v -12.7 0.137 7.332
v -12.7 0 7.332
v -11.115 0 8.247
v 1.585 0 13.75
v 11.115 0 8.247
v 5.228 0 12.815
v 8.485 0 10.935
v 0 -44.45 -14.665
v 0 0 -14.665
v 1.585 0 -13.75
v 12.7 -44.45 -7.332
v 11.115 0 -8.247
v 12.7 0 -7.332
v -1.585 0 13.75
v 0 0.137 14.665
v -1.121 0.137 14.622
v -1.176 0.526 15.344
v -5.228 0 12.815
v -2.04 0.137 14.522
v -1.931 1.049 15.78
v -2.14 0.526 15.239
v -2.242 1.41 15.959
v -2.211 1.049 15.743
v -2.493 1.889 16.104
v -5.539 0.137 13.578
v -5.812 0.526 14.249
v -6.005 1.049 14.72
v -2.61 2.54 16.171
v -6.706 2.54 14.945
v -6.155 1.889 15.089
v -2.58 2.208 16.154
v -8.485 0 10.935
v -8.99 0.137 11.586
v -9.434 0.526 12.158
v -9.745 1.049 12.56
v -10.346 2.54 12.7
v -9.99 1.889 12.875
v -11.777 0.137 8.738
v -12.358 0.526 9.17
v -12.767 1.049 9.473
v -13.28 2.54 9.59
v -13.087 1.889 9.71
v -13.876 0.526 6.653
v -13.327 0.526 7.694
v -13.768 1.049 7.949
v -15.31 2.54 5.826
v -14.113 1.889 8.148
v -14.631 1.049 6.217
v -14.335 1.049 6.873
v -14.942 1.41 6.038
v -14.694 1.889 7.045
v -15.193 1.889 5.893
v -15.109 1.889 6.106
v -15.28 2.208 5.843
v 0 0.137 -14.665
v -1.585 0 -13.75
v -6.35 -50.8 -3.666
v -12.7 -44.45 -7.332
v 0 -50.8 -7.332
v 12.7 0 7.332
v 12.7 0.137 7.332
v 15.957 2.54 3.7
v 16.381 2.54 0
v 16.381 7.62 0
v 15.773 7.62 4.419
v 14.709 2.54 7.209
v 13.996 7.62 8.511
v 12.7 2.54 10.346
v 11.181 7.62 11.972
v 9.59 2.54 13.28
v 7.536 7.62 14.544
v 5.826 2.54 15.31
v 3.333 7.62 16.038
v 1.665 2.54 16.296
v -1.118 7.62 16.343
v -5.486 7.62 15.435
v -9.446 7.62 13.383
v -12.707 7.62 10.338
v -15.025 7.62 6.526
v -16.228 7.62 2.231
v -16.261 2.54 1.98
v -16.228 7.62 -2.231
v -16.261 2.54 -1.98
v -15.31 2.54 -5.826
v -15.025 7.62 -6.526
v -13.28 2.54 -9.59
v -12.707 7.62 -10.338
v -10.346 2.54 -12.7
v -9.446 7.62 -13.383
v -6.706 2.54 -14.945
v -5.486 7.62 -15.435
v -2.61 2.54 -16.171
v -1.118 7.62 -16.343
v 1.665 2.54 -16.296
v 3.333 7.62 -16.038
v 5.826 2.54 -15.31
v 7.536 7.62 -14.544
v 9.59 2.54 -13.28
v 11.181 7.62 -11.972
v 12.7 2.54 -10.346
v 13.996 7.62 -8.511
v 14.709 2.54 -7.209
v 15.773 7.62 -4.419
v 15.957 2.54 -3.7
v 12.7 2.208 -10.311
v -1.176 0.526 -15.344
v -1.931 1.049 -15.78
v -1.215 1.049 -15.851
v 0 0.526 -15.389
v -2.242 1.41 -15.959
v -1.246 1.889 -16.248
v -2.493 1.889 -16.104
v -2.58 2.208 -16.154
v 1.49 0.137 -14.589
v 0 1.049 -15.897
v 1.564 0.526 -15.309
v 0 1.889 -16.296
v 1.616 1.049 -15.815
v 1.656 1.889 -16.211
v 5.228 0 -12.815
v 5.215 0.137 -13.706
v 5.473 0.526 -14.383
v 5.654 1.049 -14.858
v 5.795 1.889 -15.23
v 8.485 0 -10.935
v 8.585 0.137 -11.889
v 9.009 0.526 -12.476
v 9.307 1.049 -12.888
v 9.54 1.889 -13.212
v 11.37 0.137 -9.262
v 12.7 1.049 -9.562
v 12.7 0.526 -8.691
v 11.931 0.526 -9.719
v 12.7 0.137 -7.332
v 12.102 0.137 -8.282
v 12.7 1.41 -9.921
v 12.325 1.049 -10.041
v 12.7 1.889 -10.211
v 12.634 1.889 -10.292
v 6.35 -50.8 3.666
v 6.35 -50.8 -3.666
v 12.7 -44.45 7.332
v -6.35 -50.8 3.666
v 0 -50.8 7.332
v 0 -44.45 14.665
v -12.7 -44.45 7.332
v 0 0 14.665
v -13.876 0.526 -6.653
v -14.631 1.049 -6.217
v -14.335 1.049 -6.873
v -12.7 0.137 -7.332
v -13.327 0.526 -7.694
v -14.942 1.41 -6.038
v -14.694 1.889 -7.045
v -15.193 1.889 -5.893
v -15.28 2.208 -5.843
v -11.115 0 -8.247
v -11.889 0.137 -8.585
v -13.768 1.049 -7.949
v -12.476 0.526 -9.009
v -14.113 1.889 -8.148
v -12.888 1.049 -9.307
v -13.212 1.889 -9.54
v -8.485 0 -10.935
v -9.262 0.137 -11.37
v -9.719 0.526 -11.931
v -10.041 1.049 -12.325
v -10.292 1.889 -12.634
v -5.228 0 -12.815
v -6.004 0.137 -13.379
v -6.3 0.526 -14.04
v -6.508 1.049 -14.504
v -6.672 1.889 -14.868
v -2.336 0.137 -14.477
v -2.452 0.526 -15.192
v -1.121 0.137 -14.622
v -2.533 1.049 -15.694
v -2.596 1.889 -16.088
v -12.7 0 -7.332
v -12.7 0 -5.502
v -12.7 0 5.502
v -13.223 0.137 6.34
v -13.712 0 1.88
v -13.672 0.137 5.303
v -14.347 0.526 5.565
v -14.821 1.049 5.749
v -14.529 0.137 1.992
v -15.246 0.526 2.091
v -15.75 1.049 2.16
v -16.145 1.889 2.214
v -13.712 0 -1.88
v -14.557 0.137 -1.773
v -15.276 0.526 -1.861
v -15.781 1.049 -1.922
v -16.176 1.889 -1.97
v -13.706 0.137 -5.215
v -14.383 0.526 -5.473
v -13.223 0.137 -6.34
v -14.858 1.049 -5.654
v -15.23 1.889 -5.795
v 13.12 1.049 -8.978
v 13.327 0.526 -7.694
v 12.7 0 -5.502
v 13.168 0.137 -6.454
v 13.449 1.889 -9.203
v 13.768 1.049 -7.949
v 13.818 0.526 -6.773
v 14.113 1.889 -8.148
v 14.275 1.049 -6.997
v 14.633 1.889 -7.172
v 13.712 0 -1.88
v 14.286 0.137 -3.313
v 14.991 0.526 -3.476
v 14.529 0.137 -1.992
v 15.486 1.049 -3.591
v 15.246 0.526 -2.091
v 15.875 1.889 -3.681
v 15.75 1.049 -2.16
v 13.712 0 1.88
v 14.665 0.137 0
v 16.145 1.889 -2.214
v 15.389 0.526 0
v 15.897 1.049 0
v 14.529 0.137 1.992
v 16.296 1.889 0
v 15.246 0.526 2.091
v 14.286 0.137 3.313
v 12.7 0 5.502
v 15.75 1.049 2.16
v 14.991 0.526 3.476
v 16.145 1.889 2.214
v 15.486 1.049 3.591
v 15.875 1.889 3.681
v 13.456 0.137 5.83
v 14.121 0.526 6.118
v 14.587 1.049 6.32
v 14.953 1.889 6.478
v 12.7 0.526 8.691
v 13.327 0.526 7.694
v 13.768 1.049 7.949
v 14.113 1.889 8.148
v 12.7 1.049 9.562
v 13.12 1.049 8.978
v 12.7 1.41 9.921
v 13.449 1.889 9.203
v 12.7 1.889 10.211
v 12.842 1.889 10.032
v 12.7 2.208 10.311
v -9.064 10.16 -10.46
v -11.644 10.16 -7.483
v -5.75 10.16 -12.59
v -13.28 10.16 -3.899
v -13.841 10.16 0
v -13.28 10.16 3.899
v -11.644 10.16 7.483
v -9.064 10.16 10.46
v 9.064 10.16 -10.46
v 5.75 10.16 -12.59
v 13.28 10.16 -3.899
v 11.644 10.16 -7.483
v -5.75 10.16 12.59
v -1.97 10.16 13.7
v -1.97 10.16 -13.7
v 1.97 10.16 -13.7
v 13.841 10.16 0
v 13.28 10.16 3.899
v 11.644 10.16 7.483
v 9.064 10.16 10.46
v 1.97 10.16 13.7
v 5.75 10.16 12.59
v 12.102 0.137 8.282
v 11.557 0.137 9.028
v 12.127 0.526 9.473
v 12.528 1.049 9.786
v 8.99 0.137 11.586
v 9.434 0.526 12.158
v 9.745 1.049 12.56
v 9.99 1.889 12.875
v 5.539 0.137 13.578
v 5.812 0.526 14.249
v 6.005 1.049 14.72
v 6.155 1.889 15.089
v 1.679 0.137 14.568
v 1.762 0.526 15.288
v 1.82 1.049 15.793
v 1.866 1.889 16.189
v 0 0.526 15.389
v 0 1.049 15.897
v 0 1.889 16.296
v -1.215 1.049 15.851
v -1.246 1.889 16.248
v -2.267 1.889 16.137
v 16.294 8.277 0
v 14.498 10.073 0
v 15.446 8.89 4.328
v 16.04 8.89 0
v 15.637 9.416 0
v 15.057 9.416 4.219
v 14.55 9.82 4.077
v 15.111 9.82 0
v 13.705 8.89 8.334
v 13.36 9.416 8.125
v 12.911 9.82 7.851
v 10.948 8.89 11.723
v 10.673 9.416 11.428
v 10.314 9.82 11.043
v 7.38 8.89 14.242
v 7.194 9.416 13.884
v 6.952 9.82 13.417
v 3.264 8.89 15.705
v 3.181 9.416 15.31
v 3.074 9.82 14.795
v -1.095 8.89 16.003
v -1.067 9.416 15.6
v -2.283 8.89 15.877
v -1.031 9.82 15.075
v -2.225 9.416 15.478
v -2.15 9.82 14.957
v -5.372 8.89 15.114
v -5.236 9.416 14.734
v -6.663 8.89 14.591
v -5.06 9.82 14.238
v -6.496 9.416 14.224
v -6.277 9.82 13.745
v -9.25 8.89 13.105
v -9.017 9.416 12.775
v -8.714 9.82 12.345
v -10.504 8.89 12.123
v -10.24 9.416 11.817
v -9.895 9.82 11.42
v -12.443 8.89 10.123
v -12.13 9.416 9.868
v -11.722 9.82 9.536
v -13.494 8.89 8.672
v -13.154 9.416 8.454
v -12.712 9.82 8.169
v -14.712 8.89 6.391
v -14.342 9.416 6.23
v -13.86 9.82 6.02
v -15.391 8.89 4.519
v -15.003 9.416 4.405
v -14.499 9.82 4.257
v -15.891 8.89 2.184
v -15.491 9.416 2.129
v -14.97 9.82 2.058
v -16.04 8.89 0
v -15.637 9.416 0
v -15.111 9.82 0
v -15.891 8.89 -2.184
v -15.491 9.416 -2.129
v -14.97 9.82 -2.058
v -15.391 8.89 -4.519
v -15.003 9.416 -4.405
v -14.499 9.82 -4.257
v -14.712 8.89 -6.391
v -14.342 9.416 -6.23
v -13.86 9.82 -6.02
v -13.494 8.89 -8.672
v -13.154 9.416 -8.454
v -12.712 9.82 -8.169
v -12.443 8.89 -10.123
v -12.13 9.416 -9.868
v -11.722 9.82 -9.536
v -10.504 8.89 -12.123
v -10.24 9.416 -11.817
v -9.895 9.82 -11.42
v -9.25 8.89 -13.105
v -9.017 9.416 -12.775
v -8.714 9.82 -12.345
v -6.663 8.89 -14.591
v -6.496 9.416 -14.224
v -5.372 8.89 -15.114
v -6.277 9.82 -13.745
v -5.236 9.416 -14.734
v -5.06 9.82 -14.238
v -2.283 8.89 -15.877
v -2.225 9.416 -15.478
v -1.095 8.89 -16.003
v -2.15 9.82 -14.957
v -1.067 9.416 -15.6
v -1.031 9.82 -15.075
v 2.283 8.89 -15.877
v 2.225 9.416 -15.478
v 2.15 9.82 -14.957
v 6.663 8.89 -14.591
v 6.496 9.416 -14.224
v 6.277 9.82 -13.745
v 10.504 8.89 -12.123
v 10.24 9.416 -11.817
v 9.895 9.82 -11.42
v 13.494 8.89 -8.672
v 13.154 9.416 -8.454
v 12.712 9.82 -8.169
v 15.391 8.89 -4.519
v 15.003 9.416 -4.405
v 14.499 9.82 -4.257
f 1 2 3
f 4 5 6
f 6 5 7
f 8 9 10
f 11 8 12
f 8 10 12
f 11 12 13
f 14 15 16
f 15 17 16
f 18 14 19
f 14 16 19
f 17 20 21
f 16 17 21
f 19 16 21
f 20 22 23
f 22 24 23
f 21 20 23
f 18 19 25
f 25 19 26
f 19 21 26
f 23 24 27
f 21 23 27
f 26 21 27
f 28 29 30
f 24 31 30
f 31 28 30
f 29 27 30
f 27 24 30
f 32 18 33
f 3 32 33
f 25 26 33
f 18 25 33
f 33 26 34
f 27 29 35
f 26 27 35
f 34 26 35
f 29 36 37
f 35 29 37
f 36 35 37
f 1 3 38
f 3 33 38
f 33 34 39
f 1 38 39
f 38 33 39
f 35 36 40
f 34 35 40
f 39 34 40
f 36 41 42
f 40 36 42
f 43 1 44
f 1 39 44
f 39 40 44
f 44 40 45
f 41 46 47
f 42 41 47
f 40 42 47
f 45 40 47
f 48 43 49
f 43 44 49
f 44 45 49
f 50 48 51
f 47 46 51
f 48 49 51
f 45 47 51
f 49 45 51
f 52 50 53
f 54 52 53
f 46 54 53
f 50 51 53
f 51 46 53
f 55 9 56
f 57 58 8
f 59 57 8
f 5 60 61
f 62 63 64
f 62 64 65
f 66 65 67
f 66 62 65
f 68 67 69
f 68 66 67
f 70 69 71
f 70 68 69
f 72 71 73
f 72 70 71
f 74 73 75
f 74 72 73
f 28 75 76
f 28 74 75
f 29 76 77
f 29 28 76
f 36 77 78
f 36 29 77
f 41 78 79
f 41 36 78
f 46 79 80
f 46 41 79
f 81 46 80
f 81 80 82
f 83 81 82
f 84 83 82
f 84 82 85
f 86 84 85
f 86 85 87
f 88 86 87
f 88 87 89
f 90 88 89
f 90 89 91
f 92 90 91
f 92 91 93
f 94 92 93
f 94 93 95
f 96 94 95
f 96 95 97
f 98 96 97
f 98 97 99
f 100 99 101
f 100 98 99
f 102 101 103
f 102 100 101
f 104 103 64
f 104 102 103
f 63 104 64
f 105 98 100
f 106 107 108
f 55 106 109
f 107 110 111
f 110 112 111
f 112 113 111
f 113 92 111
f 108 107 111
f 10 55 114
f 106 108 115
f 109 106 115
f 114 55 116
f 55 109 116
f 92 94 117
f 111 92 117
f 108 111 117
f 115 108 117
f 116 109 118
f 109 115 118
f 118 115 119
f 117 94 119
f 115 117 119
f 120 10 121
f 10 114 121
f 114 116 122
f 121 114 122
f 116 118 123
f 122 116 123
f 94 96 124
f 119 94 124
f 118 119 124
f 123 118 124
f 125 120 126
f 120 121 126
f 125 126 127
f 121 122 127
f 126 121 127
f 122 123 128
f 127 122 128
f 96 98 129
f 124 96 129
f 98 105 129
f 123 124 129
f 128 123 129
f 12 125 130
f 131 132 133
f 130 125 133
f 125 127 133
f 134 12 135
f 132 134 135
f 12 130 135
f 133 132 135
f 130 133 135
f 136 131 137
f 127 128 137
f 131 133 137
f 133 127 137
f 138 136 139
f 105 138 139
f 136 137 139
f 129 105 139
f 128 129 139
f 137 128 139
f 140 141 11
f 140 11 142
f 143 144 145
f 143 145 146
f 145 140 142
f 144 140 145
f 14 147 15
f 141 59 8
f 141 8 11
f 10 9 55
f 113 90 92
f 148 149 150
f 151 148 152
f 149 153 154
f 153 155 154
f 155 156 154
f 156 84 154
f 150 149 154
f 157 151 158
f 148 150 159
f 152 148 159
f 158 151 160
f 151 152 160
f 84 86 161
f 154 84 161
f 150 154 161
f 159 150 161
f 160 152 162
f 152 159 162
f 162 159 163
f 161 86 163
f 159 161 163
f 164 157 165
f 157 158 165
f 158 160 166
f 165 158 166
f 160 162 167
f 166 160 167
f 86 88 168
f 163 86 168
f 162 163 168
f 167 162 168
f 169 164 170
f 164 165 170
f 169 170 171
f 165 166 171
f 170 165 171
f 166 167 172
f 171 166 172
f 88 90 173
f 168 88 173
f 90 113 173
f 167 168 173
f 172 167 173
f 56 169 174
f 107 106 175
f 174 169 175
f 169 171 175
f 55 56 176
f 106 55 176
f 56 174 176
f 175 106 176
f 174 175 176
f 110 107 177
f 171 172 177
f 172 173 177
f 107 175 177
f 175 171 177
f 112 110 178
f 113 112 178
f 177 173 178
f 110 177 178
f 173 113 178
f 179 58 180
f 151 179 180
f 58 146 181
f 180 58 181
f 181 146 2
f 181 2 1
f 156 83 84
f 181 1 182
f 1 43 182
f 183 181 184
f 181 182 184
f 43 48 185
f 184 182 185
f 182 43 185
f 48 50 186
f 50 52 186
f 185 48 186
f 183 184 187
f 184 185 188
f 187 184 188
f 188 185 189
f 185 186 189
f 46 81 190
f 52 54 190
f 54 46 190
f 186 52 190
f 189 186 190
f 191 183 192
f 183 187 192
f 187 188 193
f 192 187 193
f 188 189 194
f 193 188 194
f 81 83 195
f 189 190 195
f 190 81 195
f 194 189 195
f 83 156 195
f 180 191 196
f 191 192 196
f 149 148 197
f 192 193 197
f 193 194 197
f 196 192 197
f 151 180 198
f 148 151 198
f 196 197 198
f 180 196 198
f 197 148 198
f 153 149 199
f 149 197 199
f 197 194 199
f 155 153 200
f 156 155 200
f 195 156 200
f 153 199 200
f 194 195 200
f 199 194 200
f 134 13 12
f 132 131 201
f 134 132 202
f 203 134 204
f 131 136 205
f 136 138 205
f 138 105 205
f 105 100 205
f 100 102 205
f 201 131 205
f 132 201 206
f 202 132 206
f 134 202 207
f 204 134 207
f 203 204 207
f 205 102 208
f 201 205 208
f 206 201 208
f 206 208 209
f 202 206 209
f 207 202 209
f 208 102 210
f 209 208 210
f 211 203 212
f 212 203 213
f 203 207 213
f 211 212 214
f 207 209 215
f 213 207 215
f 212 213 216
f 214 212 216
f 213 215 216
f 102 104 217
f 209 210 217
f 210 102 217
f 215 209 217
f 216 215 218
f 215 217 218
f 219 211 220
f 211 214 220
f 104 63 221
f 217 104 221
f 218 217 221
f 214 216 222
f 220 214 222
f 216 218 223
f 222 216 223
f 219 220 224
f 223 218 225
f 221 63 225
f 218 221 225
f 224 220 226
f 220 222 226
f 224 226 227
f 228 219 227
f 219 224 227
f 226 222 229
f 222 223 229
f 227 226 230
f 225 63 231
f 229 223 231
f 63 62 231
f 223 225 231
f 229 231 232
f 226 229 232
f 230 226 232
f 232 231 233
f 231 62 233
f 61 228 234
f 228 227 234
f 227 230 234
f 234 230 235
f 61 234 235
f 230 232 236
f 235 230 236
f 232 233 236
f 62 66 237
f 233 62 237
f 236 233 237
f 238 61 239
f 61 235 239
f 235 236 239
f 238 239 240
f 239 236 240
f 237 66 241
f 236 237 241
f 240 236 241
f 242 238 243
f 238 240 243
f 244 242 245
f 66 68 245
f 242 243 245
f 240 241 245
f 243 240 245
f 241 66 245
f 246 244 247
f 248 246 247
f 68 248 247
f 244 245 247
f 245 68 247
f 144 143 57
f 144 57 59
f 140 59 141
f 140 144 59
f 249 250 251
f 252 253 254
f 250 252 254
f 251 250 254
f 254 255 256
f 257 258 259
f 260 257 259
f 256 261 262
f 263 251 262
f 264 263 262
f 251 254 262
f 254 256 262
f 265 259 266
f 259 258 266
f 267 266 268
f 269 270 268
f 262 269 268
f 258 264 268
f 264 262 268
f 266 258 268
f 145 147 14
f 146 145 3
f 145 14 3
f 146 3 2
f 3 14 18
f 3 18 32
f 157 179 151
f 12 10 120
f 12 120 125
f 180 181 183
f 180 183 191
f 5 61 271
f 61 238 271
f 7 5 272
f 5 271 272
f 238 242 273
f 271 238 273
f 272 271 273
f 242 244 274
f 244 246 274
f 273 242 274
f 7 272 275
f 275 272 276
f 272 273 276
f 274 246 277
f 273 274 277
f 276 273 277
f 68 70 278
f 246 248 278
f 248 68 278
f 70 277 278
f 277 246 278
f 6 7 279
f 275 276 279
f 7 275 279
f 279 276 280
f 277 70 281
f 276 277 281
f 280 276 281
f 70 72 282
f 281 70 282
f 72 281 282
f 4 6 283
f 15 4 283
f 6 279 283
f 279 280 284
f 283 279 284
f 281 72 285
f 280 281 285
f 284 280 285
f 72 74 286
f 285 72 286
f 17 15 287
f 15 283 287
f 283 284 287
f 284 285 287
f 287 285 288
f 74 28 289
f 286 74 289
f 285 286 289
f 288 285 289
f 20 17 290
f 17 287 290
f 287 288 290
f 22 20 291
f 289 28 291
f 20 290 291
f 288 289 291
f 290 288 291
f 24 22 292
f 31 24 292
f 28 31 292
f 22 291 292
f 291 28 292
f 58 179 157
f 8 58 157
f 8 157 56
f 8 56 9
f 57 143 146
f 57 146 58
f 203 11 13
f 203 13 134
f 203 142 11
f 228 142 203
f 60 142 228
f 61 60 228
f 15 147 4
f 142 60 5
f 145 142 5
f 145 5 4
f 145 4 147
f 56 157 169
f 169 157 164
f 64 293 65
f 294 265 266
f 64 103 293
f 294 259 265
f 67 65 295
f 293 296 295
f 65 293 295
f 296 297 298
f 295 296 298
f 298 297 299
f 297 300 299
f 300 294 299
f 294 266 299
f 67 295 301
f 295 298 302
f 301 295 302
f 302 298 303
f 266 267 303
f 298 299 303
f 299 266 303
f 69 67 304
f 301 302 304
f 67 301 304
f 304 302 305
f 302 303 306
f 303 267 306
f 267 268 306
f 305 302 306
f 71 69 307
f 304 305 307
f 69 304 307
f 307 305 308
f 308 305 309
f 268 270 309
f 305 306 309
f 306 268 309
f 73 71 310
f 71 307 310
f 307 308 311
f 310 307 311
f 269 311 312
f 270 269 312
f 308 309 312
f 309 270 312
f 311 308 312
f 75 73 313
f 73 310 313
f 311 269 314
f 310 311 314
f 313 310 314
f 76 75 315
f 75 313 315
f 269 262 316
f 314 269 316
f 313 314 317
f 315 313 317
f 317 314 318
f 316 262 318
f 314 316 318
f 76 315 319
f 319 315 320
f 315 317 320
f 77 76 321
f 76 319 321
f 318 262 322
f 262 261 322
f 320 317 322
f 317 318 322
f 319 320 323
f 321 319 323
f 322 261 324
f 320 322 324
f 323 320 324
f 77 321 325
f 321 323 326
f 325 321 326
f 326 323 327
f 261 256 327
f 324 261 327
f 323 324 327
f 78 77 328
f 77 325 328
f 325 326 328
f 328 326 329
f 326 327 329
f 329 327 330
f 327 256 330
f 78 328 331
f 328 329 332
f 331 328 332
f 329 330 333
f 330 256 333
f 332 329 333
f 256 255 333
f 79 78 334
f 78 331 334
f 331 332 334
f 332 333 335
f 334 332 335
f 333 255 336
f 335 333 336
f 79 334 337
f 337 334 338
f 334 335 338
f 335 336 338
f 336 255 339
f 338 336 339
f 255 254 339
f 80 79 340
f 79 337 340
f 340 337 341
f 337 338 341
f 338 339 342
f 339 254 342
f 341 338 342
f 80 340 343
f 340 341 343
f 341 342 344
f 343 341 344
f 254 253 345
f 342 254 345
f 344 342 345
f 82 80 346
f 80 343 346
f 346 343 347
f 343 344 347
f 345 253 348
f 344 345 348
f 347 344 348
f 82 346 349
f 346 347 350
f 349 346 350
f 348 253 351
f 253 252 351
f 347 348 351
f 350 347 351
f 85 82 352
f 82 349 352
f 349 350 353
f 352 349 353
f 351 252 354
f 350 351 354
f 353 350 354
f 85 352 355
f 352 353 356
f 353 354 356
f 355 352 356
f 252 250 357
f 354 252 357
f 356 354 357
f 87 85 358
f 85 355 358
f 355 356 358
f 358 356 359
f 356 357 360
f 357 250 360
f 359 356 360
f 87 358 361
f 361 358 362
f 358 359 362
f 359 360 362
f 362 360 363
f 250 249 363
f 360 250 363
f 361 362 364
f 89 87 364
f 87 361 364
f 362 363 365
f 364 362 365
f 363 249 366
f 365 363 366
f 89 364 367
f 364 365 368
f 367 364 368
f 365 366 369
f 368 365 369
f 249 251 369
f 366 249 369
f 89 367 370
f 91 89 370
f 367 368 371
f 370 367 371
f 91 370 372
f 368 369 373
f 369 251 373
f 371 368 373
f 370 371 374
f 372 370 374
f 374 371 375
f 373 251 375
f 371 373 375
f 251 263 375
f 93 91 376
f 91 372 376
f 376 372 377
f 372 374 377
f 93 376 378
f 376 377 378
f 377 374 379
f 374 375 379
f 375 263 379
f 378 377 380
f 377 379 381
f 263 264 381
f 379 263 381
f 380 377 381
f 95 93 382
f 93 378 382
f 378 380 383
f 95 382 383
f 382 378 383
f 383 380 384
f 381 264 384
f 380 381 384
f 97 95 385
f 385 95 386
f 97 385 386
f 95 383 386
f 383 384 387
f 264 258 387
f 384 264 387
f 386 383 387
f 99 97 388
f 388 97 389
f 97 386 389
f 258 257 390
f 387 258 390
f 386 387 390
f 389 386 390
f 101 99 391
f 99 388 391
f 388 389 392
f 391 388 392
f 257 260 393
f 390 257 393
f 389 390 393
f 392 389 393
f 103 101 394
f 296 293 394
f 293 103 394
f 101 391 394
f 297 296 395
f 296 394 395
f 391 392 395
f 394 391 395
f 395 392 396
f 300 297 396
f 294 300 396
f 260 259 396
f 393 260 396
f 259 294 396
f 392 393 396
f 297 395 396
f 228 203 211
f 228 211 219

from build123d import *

# Parameters (mm, degrees)
F1_DEPTH = 50.8
F2_R     = 16.3806904911
F3_DEPTH = 10.16
F6_SIZE  = 6.35


# Not quite as in the source:
# - a fillet or chamfer that OpenCascade refuses, or shapes differently, is made with other operations: its cross-section is extruded or revolved along the edge and cut away or added


with BuildPart() as f1:
    # F0 (on Front) → F1 (new body)
    with BuildSketch(Plane.XZ):
        Polygon((12.7, -7.3323484187), (12.7, 7.3323484187), (0, 14.6646968374), (-12.7, 7.3323484187), (-12.7, -7.3323484187), (0, -14.6646968374), align=None)
    extrude(amount=F1_DEPTH)

    # F2 (on Front) + F1_face (on face) + F1_face1 (on face) → F3 (join)
    with BuildSketch(Plane.XZ):
        Circle(F2_R)
    with BuildSketch(Plane(origin=(0, 0, 0), x_dir=(1, 0, 0), z_dir=(0, 1, 0))):
        Polygon((12.7, -7.3323484187), (12.7, 7.3323484187), (0, 14.6646968374), (-12.7, 7.3323484187), (-12.7, -7.3323484187), (0, -14.6646968374), align=None)
    with BuildSketch(Plane.XZ.offset(50.8)):
        Polygon((12.7, -7.3323484187), (12.7, 7.3323484187), (0, 14.6646968374), (-12.7, 7.3323484187), (-12.7, -7.3323484187), (0, -14.6646968374), align=None)
    extrude(amount=-F3_DEPTH, dir=(0, -1, 0))

    # F4: fillet of radius 2.54 on 3 edges, made by hand

    # F4_s1 → F4_t2 (revolve, cut)
    with BuildSketch(Plane.XY):
        with BuildLine():
            ThreePointArc((16.3806904911, 7.62), (15.6367417153, 9.4160512242), (13.8406904911, 10.16))
            Line((13.8406904911, 10.16), (16.3806904911, 10.16))
            Line((16.3806904911, 10.16), (16.3806904911, 7.62))
        make_face()
    revolve(axis=Axis((0, 10.16, 0), (0, -1, 0)), mode=Mode.SUBTRACT)


with BuildPart() as f4_tool4:
    # F4_s5 → F4_t6 (revolve)
    with BuildSketch(Plane.XY):
        with BuildLine():
            ThreePointArc((13.8406904911, 0), (15.6367417153, 0.7439487758), (16.3806904911, 2.54))
            Line((16.3806904911, 2.54), (16.3806904911, 0))
            Line((16.3806904911, 0), (13.8406904911, 0))
        make_face()
    revolve(axis=Axis((0, 0, 0), (0, -1, 0)))

    split(bisect_by=Plane.YZ.offset(12.7), keep=Keep.TOP)


with BuildPart() as f1_1:
    add(f1.part)

    # F4_t3: cut F4_tool4
    add(f4_tool4.part, mode=Mode.SUBTRACT)


with BuildPart() as f4_tool9:
    # F4_s10 → F4_t11 (revolve)
    with BuildSketch(Plane.XY):
        with BuildLine():
            ThreePointArc((13.8406904911, 0), (15.6367417153, 0.7439487758), (16.3806904911, 2.54))
            Line((16.3806904911, 2.54), (16.3806904911, 0))
            Line((16.3806904911, 0), (13.8406904911, 0))
        make_face()
    revolve(axis=Axis((0, 0, 0), (0, -1, 0)))

    split(bisect_by=Plane(origin=(6.35, 0, 10.9985226281), x_dir=(0, 1, 0), z_dir=(0.5, 0, 0.8660254038)), keep=Keep.TOP)


with BuildPart() as f1_2:
    add(f1_1.part)

    # F4_t8: cut F4_tool9
    add(f4_tool9.part, mode=Mode.SUBTRACT)


with BuildPart() as f4_tool14:
    # F4_s15 → F4_t16 (revolve)
    with BuildSketch(Plane.XY):
        with BuildLine():
            ThreePointArc((13.8406904911, 0), (15.6367417153, 0.7439487758), (16.3806904911, 2.54))
            Line((16.3806904911, 2.54), (16.3806904911, 0))
            Line((16.3806904911, 0), (13.8406904911, 0))
        make_face()
    revolve(axis=Axis((0, 0, 0), (0, -1, 0)))

    split(bisect_by=Plane(origin=(6.35, 0, -10.9985226281), x_dir=(0, 1, 0), z_dir=(0.5, 0, -0.8660254038)), keep=Keep.TOP)


with BuildPart() as f1_3:
    add(f1_2.part)

    # F4_t13: cut F4_tool14
    add(f4_tool14.part, mode=Mode.SUBTRACT)


with BuildPart() as f4_tool19:
    # F4_s20 → F4_t21 (revolve)
    with BuildSketch(Plane.XY):
        with BuildLine():
            ThreePointArc((13.8406904911, 0), (15.6367417153, 0.7439487758), (16.3806904911, 2.54))
            Line((16.3806904911, 2.54), (16.3806904911, 0))
            Line((16.3806904911, 0), (13.8406904911, 0))
        make_face()
    revolve(axis=Axis((0, 0, 0), (0, -1, 0)))

    split(bisect_by=Plane(origin=(-6.35, 0, 10.9985226281), x_dir=(0, 1, 0), z_dir=(-0.5, 0, 0.8660254038)), keep=Keep.TOP)


with BuildPart() as f1_4:
    add(f1_3.part)

    # F4_t18: cut F4_tool19
    add(f4_tool19.part, mode=Mode.SUBTRACT)


with BuildPart() as f4_tool24:
    # F4_s25 → F4_t26 (revolve)
    with BuildSketch(Plane.XY):
        with BuildLine():
            ThreePointArc((13.8406904911, 0), (15.6367417153, 0.7439487758), (16.3806904911, 2.54))
            Line((16.3806904911, 2.54), (16.3806904911, 0))
            Line((16.3806904911, 0), (13.8406904911, 0))
        make_face()
    revolve(axis=Axis((0, 0, 0), (0, -1, 0)))

    split(bisect_by=Plane(origin=(-6.35, 0, -10.9985226281), x_dir=(0, 1, 0), z_dir=(-0.5, 0, -0.8660254038)), keep=Keep.TOP)


with BuildPart() as f1_5:
    add(f1_4.part)

    # F4_t23: cut F4_tool24
    add(f4_tool24.part, mode=Mode.SUBTRACT)


with BuildPart() as f4_tool29:
    # F4_s30 → F4_t31 (revolve)
    with BuildSketch(Plane.XY):
        with BuildLine():
            ThreePointArc((13.8406904911, 0), (15.6367417153, 0.7439487758), (16.3806904911, 2.54))
            Line((16.3806904911, 2.54), (16.3806904911, 0))
            Line((16.3806904911, 0), (13.8406904911, 0))
        make_face()
    revolve(axis=Axis((0, 0, 0), (0, -1, 0)))

    split(bisect_by=Plane.YZ.offset(-12.7), keep=Keep.BOTTOM)


with BuildPart() as f1_6:
    add(f1_5.part)

    # F4_t28: cut F4_tool29
    add(f4_tool29.part, mode=Mode.SUBTRACT)

    # F6
    f6_edges = [f1_6.edges().sort_by_distance(p)[0] for p in [
        (12.7, -50.8, 0),
        (6.35, -50.8, 10.998523),
        (-6.35, -50.8, 10.998523),
        (-12.7, -50.8, 0),
        (-6.35, -50.8, -10.998523),
        (6.35, -50.8, -10.998523),
    ]]
    chamfer(f6_edges, length=F6_SIZE)


solid = f1_6.part
